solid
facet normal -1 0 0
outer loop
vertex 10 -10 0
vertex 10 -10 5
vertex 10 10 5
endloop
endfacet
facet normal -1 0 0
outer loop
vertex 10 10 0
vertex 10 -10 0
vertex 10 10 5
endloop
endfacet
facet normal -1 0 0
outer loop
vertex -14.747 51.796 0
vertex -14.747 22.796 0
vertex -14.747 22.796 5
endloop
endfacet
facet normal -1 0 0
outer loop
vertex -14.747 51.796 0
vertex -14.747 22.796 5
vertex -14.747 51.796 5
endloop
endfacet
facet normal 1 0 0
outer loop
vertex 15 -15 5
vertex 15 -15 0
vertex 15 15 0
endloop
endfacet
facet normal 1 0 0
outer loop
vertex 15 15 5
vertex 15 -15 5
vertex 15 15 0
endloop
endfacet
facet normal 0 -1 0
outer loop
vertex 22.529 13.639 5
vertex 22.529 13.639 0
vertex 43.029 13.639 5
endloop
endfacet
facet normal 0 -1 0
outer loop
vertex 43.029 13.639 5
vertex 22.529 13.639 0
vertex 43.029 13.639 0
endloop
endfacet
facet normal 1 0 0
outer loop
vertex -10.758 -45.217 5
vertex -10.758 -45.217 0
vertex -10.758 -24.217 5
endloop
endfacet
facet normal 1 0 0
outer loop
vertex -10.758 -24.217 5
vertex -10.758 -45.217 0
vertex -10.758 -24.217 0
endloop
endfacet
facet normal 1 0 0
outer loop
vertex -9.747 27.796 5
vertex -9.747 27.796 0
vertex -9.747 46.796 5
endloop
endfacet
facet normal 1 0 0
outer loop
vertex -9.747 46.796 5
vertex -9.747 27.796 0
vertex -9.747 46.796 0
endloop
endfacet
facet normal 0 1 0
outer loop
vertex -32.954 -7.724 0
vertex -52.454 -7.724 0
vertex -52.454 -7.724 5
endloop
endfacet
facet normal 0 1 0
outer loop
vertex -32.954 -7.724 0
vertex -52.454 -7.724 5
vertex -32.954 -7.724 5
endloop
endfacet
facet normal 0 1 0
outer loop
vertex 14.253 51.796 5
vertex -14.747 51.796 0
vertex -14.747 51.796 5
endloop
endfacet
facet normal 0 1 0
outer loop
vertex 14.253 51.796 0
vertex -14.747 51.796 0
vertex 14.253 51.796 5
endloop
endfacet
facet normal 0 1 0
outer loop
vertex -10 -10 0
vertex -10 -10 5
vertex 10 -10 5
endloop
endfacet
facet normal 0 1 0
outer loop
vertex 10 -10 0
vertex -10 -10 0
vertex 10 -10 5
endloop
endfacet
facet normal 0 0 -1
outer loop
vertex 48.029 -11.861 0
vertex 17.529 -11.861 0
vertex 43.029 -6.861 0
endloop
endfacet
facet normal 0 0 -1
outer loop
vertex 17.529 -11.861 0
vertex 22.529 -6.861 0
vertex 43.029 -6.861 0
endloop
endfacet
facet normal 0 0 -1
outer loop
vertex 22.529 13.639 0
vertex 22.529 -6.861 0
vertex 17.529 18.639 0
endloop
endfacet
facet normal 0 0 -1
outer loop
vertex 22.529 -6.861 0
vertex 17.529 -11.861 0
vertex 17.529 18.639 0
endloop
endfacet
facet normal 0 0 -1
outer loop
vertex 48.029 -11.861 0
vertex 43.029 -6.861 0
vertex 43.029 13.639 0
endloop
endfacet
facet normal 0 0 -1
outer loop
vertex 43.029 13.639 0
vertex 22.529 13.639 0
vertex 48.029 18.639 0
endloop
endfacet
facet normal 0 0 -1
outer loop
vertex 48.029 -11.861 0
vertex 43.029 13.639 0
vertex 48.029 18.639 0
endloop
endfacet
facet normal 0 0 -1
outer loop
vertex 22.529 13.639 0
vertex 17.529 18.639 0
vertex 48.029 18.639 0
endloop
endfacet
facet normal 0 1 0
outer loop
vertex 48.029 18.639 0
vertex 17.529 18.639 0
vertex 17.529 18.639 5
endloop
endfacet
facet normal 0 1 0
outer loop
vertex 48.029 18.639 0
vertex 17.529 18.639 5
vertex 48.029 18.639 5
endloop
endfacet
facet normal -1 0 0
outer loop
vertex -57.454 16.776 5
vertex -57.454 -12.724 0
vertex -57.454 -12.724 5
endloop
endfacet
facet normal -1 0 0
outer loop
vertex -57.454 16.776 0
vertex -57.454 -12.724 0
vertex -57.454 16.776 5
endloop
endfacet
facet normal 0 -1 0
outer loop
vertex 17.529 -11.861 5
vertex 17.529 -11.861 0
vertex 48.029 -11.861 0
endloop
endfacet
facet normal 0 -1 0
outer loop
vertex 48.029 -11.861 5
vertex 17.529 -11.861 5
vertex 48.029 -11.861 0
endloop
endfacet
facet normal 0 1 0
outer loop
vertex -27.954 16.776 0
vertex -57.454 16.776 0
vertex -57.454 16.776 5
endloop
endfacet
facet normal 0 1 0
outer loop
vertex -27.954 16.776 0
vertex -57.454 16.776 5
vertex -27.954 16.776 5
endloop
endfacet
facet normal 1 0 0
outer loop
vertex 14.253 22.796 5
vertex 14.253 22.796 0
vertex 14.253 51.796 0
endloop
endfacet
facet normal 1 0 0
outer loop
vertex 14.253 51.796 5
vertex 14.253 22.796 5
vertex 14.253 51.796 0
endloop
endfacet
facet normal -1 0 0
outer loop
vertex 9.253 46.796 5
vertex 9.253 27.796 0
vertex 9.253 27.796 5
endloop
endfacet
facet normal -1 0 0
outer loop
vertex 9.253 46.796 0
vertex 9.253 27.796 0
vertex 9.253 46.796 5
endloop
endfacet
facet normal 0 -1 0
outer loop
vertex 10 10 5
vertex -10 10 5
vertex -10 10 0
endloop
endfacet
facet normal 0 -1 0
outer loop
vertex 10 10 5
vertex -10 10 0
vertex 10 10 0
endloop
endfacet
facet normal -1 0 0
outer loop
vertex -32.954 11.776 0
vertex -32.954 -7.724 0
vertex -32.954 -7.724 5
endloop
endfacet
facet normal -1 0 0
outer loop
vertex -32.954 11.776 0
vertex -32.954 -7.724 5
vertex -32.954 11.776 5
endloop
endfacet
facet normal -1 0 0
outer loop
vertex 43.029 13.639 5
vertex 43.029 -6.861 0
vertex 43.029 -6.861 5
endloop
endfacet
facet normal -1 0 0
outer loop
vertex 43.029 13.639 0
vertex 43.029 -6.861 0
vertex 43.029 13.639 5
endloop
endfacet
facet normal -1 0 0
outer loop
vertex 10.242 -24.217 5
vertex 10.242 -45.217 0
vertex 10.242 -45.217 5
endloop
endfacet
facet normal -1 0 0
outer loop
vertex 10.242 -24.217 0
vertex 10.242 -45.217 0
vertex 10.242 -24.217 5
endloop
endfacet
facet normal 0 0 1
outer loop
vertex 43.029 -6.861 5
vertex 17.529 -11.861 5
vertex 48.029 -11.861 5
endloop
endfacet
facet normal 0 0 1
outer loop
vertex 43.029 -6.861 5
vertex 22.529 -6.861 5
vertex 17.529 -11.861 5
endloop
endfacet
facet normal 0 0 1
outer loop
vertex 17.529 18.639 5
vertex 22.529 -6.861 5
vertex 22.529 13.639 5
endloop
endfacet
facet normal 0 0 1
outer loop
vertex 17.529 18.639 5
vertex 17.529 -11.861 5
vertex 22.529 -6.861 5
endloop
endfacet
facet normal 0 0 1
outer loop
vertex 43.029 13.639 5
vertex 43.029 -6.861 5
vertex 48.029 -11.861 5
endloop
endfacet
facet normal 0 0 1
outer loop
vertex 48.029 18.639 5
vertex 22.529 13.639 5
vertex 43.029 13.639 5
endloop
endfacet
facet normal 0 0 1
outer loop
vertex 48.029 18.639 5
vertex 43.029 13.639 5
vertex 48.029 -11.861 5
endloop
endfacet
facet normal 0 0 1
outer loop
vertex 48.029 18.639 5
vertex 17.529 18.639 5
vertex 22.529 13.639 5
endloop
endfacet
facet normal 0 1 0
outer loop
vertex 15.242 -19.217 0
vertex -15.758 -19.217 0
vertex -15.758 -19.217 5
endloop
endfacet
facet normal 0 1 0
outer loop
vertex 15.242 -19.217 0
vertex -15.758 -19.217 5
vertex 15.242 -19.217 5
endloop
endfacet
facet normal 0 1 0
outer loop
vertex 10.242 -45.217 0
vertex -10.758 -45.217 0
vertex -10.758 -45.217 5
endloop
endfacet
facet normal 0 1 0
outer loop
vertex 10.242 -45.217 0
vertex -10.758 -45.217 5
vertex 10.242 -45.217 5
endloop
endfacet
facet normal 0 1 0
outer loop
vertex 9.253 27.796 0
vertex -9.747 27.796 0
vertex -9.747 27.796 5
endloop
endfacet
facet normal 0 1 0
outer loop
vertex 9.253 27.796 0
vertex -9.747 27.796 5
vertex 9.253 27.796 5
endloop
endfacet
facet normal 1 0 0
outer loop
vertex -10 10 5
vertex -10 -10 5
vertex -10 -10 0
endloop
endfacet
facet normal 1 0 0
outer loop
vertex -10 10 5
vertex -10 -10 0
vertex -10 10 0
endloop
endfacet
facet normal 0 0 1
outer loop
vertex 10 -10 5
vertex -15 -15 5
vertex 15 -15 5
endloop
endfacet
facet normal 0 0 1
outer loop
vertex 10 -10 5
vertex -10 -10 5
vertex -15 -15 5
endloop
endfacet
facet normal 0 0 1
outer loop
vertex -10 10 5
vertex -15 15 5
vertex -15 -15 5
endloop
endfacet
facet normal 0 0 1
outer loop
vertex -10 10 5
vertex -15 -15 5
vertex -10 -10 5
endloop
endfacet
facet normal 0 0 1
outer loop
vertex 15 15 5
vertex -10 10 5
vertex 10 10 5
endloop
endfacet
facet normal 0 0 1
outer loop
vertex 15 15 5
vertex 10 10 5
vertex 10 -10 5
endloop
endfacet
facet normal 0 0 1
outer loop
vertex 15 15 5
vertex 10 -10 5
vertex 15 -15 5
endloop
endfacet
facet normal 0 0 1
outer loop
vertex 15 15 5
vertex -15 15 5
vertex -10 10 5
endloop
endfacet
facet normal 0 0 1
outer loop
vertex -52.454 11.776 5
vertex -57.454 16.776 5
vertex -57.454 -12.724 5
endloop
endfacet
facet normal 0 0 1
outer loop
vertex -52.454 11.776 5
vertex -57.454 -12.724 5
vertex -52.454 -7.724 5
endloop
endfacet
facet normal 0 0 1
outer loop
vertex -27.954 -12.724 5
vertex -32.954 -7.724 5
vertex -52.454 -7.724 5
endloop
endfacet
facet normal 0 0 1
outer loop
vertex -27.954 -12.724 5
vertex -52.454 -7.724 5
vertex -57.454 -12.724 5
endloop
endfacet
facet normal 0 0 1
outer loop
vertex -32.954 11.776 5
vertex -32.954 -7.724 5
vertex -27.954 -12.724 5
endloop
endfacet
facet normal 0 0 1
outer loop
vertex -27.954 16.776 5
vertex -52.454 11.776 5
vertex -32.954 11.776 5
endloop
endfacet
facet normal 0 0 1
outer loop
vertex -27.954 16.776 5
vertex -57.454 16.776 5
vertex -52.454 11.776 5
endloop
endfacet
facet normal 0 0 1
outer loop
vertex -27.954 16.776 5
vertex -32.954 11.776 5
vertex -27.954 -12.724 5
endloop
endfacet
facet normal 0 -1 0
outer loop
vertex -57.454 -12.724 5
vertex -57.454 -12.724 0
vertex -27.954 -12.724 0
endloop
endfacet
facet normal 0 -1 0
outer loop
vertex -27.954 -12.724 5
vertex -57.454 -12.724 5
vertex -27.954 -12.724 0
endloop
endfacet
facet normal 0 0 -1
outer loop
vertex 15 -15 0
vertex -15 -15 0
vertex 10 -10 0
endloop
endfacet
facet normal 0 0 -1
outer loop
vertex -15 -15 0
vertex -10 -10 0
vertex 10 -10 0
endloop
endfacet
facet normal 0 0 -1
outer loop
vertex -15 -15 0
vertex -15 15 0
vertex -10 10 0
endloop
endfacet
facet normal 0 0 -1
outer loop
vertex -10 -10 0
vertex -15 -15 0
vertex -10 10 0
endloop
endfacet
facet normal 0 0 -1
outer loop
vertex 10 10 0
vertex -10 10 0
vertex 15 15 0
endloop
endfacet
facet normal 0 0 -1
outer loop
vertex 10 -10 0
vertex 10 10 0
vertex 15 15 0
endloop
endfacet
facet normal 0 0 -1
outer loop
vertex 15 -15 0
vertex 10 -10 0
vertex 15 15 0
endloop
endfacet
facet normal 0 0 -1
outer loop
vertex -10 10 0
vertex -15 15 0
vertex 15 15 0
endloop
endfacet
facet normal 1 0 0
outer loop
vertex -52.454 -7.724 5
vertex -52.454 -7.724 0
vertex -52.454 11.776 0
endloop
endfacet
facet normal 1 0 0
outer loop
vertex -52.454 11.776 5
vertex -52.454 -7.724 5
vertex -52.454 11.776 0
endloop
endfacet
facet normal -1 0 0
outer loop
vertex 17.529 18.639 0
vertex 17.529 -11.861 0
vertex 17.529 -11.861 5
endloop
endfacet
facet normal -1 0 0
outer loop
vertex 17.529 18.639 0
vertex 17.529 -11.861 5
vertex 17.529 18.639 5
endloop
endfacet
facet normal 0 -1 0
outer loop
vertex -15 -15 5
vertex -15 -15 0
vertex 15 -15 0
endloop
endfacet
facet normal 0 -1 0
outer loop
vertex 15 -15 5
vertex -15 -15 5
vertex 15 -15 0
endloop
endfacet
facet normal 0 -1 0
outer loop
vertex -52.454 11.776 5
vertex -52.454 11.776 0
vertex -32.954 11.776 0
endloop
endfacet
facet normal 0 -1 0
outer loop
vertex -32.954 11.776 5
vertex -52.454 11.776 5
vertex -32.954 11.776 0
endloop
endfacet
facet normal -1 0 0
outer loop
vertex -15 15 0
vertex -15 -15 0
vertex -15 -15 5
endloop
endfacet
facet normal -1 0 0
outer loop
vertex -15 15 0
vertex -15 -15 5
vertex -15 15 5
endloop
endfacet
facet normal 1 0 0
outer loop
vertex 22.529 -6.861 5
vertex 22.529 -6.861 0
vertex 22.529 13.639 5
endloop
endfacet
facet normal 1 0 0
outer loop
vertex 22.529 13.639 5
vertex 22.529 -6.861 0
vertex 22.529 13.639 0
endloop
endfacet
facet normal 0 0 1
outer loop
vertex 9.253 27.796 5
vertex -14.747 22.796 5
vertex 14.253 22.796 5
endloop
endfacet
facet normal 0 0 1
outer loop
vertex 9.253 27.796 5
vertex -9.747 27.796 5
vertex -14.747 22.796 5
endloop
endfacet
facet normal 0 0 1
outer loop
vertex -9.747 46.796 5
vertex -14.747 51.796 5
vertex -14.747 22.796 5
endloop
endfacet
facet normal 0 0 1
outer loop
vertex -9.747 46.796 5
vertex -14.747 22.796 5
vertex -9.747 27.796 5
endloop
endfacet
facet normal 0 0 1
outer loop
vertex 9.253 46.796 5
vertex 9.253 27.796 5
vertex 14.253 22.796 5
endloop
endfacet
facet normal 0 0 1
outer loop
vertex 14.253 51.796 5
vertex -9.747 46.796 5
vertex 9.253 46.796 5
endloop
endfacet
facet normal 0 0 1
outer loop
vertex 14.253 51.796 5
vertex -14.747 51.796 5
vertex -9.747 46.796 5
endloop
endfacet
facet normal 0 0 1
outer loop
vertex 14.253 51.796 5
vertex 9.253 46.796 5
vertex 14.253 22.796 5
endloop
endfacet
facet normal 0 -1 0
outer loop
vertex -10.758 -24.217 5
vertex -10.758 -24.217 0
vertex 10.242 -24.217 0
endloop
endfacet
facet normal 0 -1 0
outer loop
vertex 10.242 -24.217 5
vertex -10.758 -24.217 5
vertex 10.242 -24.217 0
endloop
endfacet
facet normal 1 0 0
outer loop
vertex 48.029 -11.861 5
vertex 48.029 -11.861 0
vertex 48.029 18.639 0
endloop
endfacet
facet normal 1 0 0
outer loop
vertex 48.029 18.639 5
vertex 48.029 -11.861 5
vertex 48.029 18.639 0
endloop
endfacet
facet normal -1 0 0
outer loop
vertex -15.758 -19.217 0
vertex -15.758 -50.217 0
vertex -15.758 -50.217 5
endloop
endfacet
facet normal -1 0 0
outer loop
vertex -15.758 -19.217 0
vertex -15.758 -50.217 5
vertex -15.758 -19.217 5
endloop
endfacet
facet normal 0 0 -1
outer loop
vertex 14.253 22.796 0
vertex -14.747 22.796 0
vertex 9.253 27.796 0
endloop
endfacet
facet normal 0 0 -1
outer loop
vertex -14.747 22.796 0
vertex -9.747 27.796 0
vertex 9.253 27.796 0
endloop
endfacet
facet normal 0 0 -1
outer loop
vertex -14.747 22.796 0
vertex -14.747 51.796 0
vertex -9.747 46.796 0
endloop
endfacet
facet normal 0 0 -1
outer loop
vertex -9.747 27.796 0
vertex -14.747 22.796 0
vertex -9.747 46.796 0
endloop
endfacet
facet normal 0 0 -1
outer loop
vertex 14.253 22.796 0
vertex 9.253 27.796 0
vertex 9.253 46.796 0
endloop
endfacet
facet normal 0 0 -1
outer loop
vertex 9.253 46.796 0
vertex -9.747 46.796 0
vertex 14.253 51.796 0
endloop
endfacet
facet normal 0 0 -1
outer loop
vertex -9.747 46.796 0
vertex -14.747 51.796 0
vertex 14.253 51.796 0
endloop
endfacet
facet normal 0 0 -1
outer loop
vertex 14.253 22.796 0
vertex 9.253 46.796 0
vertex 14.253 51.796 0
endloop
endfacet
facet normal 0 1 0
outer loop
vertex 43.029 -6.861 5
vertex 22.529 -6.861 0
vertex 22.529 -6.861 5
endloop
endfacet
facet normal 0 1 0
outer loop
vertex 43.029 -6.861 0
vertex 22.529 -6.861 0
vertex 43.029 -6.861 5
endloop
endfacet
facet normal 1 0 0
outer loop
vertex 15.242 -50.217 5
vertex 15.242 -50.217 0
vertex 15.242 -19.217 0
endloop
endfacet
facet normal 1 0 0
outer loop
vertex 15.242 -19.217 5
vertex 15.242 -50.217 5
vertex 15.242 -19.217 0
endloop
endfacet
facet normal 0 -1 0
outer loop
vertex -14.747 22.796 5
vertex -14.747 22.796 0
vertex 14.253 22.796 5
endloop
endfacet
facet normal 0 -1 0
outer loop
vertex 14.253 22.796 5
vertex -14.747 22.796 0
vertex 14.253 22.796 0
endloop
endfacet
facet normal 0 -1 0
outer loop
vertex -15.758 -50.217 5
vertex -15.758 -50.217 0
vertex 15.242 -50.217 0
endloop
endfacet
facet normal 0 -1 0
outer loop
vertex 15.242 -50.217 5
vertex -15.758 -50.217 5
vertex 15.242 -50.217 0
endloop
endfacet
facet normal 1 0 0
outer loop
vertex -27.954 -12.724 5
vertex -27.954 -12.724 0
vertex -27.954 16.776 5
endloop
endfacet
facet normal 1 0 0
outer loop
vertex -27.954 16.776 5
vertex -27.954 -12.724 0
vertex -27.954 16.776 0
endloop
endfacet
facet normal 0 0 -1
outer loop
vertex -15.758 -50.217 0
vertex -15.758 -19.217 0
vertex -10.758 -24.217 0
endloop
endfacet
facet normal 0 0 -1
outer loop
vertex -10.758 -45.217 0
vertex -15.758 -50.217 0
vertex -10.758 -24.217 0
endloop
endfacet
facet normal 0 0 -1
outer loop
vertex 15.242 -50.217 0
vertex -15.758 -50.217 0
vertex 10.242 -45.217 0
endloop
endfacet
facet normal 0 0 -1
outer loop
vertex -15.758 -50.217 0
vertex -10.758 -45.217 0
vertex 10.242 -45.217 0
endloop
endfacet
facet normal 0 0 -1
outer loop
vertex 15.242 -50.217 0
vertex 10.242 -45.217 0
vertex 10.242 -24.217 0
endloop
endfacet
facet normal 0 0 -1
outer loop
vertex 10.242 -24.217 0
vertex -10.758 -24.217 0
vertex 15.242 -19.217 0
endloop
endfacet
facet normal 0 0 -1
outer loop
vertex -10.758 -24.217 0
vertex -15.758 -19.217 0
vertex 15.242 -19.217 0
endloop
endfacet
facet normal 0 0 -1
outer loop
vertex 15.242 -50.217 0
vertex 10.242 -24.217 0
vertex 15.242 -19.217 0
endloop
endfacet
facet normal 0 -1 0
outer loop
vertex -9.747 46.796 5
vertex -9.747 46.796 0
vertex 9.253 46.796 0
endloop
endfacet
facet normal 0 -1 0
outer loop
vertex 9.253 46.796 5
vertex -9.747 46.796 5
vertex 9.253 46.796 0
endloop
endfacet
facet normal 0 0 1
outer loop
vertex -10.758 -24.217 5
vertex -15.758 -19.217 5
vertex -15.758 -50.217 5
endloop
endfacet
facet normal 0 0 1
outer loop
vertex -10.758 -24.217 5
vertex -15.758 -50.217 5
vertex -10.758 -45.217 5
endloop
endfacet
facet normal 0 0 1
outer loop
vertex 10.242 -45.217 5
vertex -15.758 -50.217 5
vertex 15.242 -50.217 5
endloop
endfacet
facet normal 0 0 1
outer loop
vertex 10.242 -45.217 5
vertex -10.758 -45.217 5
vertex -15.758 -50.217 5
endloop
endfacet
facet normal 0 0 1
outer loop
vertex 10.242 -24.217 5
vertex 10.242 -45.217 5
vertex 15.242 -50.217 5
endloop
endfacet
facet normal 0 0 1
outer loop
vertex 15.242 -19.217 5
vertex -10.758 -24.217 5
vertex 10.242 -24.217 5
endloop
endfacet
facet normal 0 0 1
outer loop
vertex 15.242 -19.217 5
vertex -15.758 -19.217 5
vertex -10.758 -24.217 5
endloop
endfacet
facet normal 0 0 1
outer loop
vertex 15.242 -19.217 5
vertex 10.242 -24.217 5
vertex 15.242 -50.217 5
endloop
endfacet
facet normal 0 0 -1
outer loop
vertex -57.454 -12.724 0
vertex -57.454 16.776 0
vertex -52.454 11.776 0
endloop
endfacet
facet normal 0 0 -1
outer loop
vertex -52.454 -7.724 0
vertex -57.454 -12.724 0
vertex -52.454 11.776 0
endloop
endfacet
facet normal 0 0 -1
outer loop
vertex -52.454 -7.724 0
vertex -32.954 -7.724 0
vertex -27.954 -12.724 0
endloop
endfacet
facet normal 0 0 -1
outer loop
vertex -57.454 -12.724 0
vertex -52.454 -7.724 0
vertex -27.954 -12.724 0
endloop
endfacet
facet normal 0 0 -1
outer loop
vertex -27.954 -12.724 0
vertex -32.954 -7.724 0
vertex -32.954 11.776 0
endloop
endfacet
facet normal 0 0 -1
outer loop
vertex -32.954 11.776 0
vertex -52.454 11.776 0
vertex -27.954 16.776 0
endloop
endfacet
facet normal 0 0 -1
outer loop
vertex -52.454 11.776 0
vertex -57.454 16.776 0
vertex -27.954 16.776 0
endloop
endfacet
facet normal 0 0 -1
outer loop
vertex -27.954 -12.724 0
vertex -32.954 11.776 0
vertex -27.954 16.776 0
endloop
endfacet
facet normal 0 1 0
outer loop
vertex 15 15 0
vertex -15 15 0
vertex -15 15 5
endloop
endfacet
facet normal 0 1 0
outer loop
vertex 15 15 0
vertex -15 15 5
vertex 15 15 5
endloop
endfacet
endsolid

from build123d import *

# Parameters (mm, degrees)
F0_W      = 30
F0_H      = 30
F1_DEPTH  = 5
F2_W      = 20
F2_H      = 20
F3_DEPTH  = 5
F4_W      = 29
F4_H      = 29
F4_W_2    = 19
F4_H_2    = 19
F5_DEPTH  = 5
F6_W      = 31
F6_H      = 31
F6_W_2    = 21
F6_H_2    = 21
F7_DEPTH  = 5
F8_W      = 30.5
F8_H      = 30.5
F8_W_2    = 20.5
F8_H_2    = 20.5
F9_DEPTH  = 5
F10_W     = 29.5
F10_H     = 29.5
F10_W_2   = 19.5
F10_H_2   = 19.5
F11_DEPTH = 5


with BuildPart() as f1:
    # F0 (on Top) → F1 (new body)
    with BuildSketch(Plane.XY):
        Rectangle(F0_W, F0_H)
    extrude(amount=F1_DEPTH)

    # F2 (on face) → F3 (cut)
    with BuildSketch(Plane.XY.offset(5)):
        Rectangle(F2_W, F2_H)
    extrude(amount=-F3_DEPTH, mode=Mode.SUBTRACT)


with BuildPart() as f5:
    # F4 (on Top) → F5 (new body)
    with BuildSketch(Plane.XY):
        with Locations((-0.247106, 37.29578)):
            Rectangle(F4_W, F4_H)
        with Locations((-0.247106, 37.29578)):
            Rectangle(F4_W_2, F4_H_2, mode=Mode.SUBTRACT)
    extrude(amount=F5_DEPTH)


with BuildPart() as f7:
    # F6 (on Top) → F7 (new body)
    with BuildSketch(Plane.XY):
        with Locations((-0.25801, -34.717155)):
            Rectangle(F6_W, F6_H)
        with Locations((-0.25801, -34.717155)):
            Rectangle(F6_W_2, F6_H_2, mode=Mode.SUBTRACT)
    extrude(amount=F7_DEPTH)


with BuildPart() as f9:
    # F8 (on Top) → F9 (new body)
    with BuildSketch(Plane.XY):
        with Locations((32.779088, 3.389017)):
            Rectangle(F8_W, F8_H)
        with Locations((32.779088, 3.389017)):
            Rectangle(F8_W_2, F8_H_2, mode=Mode.SUBTRACT)
    extrude(amount=F9_DEPTH)


with BuildPart() as f11:
    # F10 (on Top) → F11 (new body)
    with BuildSketch(Plane.XY):
        with Locations((-42.704044, 2.025584)):
            Rectangle(F10_W, F10_H)
        with Locations((-42.704044, 2.025584)):
            Rectangle(F10_W_2, F10_H_2, mode=Mode.SUBTRACT)
    extrude(amount=F11_DEPTH)


solid = Compound([f1.part, f5.part, f7.part, f9.part, f11.part])
